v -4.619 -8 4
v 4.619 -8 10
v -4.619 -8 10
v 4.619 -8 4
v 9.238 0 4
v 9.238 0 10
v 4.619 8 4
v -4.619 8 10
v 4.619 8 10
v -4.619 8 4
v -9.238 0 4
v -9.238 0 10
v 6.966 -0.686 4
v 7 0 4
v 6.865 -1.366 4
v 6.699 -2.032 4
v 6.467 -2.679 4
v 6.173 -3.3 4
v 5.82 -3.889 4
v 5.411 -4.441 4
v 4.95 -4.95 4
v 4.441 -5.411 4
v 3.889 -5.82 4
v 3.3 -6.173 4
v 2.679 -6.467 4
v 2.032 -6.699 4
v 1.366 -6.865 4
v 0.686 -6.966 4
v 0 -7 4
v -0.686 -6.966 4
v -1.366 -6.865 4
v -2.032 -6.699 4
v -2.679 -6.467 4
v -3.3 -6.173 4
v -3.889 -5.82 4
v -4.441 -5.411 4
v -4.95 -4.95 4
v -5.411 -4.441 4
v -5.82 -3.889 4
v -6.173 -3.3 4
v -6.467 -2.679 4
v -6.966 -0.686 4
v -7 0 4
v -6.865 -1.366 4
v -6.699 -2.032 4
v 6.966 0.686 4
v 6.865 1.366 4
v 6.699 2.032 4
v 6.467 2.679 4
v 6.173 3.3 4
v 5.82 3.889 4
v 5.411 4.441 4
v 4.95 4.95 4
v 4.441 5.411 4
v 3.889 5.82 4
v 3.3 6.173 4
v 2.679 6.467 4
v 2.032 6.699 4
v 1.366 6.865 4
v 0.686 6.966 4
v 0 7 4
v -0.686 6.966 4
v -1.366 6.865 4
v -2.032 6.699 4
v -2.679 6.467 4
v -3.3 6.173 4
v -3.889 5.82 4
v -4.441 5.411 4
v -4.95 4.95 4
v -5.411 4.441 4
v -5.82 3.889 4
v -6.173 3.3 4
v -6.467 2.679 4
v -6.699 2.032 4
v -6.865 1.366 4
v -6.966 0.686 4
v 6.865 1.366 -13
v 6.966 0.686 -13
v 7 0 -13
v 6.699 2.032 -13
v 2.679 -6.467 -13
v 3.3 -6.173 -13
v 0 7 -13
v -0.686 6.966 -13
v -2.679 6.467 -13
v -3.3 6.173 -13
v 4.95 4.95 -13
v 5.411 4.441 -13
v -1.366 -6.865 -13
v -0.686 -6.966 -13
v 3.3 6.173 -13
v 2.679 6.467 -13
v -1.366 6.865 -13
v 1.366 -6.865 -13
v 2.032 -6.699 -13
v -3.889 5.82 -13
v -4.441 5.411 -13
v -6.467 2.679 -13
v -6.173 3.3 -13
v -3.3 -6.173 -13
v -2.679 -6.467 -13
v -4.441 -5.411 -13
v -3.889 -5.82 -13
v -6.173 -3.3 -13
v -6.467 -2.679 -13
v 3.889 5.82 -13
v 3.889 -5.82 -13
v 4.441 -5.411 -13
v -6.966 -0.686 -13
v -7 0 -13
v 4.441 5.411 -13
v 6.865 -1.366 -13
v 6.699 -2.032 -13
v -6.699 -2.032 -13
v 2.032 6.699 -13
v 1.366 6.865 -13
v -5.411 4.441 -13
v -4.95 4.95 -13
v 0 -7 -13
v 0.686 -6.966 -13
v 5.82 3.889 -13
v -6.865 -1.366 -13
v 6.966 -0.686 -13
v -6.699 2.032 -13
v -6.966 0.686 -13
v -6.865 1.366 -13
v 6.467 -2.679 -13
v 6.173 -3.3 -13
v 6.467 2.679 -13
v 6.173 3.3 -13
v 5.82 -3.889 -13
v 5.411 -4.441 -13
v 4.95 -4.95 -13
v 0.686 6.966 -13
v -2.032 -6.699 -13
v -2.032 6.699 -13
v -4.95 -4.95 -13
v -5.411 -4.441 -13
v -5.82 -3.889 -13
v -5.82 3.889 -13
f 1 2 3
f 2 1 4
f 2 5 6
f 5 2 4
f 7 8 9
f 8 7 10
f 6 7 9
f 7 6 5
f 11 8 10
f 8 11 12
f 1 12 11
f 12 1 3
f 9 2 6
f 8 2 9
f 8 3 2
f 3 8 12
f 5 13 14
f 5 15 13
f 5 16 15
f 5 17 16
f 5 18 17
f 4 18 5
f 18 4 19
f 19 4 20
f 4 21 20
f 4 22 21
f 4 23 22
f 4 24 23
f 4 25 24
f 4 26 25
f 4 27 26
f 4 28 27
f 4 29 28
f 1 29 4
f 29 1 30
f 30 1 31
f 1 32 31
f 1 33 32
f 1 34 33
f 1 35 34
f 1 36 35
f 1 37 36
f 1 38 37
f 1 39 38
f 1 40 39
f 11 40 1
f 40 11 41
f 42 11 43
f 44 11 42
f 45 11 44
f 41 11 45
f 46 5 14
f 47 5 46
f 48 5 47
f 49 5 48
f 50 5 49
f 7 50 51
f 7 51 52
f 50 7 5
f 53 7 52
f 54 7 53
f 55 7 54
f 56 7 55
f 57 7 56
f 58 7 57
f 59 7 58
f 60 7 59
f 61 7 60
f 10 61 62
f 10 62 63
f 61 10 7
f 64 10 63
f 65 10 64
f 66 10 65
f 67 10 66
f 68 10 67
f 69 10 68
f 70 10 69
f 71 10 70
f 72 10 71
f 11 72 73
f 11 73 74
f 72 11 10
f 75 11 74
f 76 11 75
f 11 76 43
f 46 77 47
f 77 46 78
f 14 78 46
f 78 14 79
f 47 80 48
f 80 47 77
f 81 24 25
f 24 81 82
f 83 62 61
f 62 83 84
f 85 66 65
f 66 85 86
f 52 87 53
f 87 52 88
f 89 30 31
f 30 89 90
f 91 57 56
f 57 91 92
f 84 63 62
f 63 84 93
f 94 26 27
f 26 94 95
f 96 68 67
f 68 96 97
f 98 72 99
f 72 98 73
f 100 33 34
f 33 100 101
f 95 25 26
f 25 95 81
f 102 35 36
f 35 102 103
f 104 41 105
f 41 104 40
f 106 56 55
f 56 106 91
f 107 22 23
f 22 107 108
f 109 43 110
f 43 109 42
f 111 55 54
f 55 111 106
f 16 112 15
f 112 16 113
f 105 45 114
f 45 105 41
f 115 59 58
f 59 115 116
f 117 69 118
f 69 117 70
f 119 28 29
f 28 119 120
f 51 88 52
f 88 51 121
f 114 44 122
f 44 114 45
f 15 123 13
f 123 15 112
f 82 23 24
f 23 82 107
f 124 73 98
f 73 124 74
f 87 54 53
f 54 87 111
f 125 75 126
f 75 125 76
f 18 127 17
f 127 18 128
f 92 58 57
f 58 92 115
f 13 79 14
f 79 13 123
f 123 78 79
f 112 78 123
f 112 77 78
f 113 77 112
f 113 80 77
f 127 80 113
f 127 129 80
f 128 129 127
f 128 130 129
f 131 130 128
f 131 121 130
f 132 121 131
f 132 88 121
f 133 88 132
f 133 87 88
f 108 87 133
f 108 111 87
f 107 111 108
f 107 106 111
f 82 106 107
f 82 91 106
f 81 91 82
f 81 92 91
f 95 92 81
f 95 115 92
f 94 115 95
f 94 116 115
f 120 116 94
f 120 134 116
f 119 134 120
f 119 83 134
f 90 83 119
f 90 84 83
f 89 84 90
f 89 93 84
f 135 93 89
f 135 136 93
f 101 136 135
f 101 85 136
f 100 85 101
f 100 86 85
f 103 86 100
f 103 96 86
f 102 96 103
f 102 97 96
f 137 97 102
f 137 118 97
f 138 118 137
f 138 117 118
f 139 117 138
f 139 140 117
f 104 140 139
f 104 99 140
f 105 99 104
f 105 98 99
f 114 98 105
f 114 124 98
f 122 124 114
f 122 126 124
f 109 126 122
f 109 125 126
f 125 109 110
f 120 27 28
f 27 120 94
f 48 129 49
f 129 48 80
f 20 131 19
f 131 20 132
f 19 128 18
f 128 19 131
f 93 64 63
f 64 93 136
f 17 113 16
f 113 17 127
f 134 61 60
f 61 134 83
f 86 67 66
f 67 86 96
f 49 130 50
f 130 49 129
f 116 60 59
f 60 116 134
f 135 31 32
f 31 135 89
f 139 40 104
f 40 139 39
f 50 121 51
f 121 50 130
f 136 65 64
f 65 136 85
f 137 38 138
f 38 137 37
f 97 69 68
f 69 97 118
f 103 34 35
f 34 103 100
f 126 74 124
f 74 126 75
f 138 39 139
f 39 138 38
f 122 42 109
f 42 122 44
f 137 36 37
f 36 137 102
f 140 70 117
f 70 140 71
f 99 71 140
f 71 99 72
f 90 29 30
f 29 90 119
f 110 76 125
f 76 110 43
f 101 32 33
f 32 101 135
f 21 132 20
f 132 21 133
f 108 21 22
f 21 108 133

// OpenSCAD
head_across_flats = 16.0;
head_height = 6.0;
shank_diameter = 14.0;
length = 20.0;
circ_r = head_across_flats / 1.7320508075688772;
union() {
  translate([0,0,(length - head_height)/2]) cylinder(h=head_height, r=circ_r, center=true, $fn=6);
  translate([0,0,-head_height/2]) cylinder(h=length, r=shank_diameter/2, center=true, $fn=64);
}
